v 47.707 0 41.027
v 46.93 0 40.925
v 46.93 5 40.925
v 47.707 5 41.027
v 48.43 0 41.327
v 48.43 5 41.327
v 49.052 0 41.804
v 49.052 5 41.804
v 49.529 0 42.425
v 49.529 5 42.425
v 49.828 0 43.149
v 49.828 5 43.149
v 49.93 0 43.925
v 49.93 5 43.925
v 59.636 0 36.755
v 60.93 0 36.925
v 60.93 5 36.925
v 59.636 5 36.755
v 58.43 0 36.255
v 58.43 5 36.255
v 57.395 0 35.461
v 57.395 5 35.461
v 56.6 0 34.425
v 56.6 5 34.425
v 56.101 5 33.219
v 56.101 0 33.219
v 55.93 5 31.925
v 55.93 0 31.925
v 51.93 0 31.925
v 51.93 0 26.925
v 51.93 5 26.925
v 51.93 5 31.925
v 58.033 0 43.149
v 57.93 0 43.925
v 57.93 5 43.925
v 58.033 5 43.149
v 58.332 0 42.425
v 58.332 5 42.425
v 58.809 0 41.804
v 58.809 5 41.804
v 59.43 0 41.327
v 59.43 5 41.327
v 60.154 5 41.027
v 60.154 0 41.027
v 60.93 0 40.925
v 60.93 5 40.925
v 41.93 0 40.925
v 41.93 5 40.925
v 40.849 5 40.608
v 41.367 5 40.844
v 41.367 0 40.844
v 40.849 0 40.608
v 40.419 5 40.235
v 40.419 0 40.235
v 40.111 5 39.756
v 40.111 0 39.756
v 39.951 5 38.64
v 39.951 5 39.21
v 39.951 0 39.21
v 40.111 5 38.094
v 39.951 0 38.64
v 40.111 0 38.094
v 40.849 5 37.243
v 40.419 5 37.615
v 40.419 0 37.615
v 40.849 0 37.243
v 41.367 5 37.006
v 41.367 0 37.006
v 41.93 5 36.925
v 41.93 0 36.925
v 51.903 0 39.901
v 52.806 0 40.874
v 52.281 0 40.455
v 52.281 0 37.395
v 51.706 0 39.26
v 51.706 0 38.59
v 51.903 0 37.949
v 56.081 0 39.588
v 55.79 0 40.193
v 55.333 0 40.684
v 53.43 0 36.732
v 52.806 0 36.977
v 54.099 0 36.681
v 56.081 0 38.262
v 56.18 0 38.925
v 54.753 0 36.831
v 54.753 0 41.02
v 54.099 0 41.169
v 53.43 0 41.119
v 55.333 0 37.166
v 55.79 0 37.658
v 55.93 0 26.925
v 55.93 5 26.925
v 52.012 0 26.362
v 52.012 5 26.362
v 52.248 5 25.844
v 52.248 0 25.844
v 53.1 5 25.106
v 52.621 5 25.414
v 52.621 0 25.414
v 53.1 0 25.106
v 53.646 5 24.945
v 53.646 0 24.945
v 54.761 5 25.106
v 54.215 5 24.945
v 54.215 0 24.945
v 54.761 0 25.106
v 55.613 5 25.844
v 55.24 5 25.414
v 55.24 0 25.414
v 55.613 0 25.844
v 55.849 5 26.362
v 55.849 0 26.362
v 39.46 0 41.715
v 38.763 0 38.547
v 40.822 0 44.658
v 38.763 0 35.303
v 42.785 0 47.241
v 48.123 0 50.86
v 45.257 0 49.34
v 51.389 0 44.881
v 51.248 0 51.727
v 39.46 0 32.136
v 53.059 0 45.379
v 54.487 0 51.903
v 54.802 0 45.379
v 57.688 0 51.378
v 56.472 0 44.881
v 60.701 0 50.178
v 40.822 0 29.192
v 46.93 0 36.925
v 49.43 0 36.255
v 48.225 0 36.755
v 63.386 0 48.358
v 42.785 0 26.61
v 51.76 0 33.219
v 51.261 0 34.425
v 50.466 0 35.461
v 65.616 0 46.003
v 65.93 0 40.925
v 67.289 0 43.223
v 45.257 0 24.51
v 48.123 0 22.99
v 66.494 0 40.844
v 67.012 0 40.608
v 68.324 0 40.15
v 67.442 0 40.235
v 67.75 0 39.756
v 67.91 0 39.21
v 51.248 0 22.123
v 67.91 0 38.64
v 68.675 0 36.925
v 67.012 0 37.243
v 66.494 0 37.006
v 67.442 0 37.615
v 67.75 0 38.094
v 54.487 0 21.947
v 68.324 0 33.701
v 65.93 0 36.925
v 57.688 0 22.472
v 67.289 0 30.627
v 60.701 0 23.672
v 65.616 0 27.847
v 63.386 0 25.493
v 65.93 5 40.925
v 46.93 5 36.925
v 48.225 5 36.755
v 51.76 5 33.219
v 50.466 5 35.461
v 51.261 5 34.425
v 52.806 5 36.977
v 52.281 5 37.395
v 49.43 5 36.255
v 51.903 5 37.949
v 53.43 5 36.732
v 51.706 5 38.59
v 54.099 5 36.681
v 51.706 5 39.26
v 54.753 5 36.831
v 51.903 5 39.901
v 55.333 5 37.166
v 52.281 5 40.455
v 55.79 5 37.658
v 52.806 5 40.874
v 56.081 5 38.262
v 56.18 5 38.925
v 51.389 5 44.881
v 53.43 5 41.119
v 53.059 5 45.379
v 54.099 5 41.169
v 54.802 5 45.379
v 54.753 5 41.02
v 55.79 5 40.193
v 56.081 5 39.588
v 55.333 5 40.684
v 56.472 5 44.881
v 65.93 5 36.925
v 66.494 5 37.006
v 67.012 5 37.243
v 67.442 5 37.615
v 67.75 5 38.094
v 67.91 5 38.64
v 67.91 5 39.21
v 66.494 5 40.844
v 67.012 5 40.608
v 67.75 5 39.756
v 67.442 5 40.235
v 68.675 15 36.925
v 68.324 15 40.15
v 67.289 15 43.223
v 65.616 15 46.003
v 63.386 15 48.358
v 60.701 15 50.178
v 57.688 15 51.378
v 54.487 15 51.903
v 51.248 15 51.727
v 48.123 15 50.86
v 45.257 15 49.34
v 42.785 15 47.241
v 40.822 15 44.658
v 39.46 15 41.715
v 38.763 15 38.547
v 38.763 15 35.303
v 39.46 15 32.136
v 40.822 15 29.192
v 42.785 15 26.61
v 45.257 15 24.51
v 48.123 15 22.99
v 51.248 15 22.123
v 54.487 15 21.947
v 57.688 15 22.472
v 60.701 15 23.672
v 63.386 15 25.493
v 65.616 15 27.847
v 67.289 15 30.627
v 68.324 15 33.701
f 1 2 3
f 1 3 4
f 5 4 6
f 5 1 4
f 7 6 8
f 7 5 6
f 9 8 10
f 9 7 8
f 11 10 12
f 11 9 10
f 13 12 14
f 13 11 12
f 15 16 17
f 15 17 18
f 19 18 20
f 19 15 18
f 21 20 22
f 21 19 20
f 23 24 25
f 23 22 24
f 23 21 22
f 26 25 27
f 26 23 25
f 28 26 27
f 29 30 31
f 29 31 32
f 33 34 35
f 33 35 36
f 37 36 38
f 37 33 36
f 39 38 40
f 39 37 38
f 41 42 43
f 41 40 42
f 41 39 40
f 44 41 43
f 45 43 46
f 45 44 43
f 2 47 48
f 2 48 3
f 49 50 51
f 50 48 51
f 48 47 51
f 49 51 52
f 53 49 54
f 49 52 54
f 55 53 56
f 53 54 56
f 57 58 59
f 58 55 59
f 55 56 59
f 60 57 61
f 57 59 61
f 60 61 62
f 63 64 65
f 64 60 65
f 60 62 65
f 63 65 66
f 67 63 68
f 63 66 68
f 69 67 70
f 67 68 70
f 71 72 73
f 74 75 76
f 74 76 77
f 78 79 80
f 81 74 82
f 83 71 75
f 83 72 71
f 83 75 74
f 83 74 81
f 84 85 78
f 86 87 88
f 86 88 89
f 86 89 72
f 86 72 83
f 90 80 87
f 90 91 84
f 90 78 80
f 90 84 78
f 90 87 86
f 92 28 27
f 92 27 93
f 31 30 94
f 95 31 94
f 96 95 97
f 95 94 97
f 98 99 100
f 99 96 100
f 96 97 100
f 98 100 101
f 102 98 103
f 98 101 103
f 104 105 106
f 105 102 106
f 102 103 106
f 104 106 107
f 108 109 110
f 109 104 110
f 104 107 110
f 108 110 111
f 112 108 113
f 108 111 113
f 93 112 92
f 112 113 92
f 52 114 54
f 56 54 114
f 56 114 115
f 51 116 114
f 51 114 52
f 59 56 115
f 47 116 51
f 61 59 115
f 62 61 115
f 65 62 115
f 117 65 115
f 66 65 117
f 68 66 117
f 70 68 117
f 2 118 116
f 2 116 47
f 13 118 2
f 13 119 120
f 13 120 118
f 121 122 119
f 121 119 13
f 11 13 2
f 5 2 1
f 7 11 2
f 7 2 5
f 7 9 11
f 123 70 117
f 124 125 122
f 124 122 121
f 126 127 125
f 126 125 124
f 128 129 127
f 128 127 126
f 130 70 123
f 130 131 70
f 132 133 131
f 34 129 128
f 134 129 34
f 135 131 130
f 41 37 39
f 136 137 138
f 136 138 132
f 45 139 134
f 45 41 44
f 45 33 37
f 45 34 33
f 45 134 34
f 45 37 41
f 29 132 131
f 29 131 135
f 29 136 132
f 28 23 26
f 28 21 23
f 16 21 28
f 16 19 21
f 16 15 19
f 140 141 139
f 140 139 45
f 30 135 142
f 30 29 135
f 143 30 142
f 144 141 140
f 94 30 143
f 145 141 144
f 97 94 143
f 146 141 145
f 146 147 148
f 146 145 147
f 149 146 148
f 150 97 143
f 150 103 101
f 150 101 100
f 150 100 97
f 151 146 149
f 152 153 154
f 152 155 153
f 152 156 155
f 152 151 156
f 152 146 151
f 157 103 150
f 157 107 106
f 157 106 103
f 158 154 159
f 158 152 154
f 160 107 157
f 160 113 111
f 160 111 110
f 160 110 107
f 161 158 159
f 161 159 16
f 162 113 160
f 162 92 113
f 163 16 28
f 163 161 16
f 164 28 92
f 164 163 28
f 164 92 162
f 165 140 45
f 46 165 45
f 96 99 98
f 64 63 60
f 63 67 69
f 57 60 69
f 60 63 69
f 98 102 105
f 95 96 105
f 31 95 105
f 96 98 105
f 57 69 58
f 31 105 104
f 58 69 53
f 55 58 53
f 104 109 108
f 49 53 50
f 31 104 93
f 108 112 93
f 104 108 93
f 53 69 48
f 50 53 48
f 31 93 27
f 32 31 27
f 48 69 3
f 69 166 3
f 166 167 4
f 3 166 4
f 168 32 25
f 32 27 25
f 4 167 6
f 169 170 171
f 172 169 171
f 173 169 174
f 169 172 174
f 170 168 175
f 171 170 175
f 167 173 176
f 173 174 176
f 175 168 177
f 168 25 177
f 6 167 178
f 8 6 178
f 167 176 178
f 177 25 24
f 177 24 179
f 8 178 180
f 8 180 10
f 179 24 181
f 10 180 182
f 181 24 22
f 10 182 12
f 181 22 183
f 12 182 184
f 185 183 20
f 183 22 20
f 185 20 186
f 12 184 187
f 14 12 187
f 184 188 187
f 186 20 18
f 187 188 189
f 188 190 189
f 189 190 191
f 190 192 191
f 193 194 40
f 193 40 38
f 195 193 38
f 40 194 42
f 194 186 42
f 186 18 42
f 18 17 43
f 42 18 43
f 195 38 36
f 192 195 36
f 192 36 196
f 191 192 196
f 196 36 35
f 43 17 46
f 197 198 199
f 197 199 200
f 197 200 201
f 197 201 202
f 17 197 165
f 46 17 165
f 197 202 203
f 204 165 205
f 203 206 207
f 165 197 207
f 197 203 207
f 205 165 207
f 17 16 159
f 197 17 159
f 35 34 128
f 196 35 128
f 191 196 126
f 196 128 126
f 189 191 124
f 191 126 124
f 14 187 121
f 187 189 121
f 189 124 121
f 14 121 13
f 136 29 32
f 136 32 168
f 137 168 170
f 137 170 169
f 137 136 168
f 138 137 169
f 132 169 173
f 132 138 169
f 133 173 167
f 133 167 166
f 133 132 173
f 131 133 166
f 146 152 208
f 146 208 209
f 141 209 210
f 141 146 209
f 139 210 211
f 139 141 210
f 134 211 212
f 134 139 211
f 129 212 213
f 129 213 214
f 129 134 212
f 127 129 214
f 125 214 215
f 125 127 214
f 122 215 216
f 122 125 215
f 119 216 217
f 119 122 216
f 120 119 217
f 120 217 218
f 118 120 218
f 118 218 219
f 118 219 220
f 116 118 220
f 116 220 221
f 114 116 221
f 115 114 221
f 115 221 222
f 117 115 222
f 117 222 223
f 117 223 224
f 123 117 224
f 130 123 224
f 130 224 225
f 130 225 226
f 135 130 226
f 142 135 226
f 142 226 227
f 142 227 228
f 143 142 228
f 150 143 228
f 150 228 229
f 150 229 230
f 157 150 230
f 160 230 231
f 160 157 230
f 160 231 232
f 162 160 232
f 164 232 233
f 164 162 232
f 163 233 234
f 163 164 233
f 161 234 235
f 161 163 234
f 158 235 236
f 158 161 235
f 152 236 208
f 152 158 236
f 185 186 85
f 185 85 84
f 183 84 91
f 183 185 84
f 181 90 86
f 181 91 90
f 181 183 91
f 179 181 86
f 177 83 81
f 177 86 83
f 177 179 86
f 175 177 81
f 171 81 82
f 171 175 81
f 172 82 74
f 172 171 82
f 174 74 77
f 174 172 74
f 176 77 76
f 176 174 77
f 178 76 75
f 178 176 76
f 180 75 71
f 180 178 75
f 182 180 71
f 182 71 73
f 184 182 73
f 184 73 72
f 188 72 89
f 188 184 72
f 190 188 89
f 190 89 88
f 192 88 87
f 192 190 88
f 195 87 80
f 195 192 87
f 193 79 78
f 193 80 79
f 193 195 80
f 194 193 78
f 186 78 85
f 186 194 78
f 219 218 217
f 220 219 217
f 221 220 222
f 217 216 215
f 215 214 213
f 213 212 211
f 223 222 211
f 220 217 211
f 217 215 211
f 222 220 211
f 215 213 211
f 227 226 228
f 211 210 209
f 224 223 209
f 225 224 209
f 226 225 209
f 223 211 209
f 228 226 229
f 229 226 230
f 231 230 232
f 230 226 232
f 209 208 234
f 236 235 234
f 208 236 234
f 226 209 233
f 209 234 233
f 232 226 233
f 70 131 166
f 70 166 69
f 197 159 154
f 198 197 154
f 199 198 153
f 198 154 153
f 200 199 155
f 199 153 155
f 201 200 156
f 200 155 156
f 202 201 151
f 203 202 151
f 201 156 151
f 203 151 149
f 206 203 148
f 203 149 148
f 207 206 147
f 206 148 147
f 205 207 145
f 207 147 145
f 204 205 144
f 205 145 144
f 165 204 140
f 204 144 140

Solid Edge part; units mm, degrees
sketch "Sketch1" plane through (0, 0, 0) normal (0, -1, 0) x (1, 0, 0)
  circle A0 centre (53.6751, 36.9251) radius 15
extrude "ExtrudedProtrusion_1" add sketch "Sketch1" against normal blind 15
sketch "Sketch2" plane through (63.9305, 0, 41.9251) normal (0, -1, 0) x (1, 0, 0)
  line L0 (-8, -10) -> (-8, -15)
  arc A0 (-8, -15) -> (-12, -15) centre (-10, -15) cw
  line L1 (-12, -15) -> (-12, -10)
  arc A1 (-12, -10) -> (-17, -5) centre (-17, -10) ccw
  line L2 (-17, -5) -> (-22, -5)
  arc A2 (-22, -5) -> (-22, -1) centre (-22, -3) cw
  line L3 (-22, -1) -> (-17, -1)
  arc A3 (-17, -1) -> (-14, 2) centre (-17, 2) ccw
  arc A4 (-14, 2) -> (-6, 2) centre (-10, -2.5133) cw
  arc A5 (-3, -1) -> (-6, 2) centre (-3, 2) cw
  line L4 (2, -1) -> (-3, -1)
  arc A6 (2, -5) -> (2, -1) centre (2, -3) ccw
  line L5 (-3, -5) -> (2, -5)
  arc A7 (-8, -10) -> (-3, -5) centre (-3, -10) cw
  dimension "D1" = 5
  dimension "D2" = 2
  dimension "D3" = 5
  dimension "D4" = 5
  dimension "D5" = 5
  dimension "D6" = 2
  dimension "D7" = 5
  dimension "D8" = 5
  dimension "D9" = 2
  dimension "D10" = 5
  dimension "D11" = 5
  dimension "D12" = 3
  dimension "D13" = 3
  dimension "D14" = 10
extrude "Cutout1" cut sketch "Sketch2" against normal blind 5
sketch "Sketch3" plane through (63.9305, 5, 35.4251) normal (0, -1, 0) x (1, 0, 0)
  circle A0 centre (-10, 3.5) radius 2.25
  dimension "D1" = 4.5
extrude "ExtrudedProtrusion_3" add sketch "Sketch3" along normal blind 5
